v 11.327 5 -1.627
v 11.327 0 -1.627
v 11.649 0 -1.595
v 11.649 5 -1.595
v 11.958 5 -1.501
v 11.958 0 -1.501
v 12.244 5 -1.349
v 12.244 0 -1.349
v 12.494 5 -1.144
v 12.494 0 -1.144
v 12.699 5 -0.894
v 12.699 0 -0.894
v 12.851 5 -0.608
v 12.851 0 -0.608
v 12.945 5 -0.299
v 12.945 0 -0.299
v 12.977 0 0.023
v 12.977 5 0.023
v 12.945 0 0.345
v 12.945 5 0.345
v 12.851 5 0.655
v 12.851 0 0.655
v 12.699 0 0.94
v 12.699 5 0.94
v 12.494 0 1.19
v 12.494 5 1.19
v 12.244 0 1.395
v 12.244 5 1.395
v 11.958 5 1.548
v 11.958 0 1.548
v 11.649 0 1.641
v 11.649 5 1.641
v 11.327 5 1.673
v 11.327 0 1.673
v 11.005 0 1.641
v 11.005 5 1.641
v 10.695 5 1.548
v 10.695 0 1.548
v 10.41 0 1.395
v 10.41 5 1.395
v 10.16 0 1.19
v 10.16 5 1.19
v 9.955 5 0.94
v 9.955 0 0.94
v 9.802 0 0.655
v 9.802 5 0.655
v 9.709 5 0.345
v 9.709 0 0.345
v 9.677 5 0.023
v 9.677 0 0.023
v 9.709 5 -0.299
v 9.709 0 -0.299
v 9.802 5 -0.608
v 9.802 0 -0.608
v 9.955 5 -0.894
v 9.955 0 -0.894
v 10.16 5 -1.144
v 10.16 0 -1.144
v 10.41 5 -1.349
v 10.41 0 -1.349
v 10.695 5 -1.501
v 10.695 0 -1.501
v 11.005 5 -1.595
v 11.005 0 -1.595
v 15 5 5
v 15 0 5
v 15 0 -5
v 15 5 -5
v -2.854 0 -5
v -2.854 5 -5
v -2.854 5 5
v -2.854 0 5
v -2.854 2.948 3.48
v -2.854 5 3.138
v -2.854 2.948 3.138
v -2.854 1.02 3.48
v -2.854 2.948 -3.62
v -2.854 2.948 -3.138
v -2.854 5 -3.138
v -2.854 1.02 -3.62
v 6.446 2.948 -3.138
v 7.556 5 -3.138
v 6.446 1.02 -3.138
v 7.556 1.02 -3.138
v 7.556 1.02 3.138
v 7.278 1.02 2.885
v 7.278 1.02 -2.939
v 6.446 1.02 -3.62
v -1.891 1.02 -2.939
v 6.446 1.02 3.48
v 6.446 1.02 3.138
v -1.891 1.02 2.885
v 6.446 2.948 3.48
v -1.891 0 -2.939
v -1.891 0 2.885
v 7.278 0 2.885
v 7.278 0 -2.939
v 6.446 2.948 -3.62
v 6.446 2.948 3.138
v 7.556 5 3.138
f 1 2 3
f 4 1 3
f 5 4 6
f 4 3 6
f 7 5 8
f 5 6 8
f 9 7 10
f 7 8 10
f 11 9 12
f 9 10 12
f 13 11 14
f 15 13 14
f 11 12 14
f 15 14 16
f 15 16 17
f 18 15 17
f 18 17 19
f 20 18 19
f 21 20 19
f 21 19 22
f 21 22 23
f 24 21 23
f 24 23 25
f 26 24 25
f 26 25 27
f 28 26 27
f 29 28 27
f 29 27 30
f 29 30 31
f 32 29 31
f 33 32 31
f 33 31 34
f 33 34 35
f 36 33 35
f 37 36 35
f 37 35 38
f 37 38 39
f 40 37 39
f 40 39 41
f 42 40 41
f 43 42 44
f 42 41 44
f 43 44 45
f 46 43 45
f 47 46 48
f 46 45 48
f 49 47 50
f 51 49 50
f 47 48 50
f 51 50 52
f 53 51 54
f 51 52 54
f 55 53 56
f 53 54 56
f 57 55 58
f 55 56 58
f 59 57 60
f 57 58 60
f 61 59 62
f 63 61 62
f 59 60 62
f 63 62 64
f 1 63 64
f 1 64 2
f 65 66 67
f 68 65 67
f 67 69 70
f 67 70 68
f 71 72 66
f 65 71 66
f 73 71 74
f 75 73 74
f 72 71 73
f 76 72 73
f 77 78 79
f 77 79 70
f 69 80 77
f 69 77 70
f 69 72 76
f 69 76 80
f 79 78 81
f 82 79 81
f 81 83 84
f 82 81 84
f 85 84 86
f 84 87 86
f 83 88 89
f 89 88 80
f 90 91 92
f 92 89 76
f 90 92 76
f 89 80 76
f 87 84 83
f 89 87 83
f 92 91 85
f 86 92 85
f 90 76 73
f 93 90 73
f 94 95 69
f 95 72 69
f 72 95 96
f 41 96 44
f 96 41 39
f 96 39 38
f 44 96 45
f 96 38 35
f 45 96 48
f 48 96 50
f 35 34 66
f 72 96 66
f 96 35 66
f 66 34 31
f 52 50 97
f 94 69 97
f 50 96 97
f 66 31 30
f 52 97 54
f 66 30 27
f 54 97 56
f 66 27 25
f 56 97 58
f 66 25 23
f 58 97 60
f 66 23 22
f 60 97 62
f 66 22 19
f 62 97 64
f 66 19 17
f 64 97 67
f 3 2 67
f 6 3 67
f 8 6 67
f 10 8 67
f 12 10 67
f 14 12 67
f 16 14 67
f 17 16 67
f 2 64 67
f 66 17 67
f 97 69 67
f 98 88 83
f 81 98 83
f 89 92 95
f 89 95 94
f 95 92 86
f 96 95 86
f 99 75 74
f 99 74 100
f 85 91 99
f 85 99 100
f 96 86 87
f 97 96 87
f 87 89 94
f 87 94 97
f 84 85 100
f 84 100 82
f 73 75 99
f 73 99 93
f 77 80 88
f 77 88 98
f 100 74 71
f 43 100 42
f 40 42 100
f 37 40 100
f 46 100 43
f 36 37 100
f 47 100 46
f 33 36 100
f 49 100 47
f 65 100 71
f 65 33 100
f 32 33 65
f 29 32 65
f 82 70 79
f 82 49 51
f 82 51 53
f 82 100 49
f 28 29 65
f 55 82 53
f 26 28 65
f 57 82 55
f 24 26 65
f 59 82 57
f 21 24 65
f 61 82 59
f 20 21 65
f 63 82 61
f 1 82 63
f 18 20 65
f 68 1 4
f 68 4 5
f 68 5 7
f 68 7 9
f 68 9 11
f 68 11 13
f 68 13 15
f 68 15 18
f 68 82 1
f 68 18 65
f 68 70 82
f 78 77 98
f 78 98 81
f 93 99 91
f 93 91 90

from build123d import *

# Parameters (mm, degrees)
SKETCH2_W           = 17.853706718
SKETCH2_H           = 10
BOSS_EXTRUDE2_DEPTH = 5
SKETCH4_W           = 7.1
SKETCH4_H           = 1.928064037
CUT_EXTRUDE1_DEPTH  = 9.3
CUT_EXTRUDE4_START  = 1.02
SKETCH6_W           = 15.11279267
SKETCH6_H           = 6.275441998
CUT_EXTRUDE4_DEPTH  = 9.3
SKETCH7_R           = 1.65
CUT_EXTRUDE7_DEPTH  = 17.583123952
SKETCH9_W           = 9.168085379
SKETCH9_H           = 5.824430712
CUT_EXTRUDE8_DEPTH  = 17.304612844


with BuildPart() as part:
    # Sketch2 → Boss-Extrude2 (new body)
    with BuildSketch(Plane(origin=(0, 0, 0), x_dir=(1, 0, 0), z_dir=(0, 1, 0))):
        with Locations((6.073146641, 0)):
            Rectangle(SKETCH2_W, SKETCH2_H)
    extrude(amount=BOSS_EXTRUDE2_DEPTH)

    # Sketch4 → Cut-Extrude1 (cut)
    with BuildSketch(Plane.ZY.offset(2.853706718)):
        with Locations((-0.07, 1.984032018)):
            Rectangle(SKETCH4_W, SKETCH4_H)
    extrude(amount=-CUT_EXTRUDE1_DEPTH, mode=Mode.SUBTRACT)

    # Sketch6 → Cut-Extrude4 (cut)
    with BuildSketch(Plane(origin=(0, 0, 0), x_dir=(1, 0, 0), z_dir=(0, 1, 0)).offset(CUT_EXTRUDE4_START)):
        Rectangle(SKETCH6_W, SKETCH6_H)
    extrude(amount=CUT_EXTRUDE4_DEPTH, mode=Mode.SUBTRACT)

    # Sketch7 → Cut-Extrude7 (cut, through all)
    with BuildSketch(Plane.XZ):
        with Locations(Location((11.326869327, 0.023099137, 0), (0, 0, 270))):
            Circle(SKETCH7_R)
    extrude(amount=-CUT_EXTRUDE7_DEPTH, mode=Mode.SUBTRACT)

    # Sketch9 → Cut-Extrude8 (cut, through all)
    with BuildSketch(Plane(origin=(0, 1.02, 0), x_dir=(1, 0, 0), z_dir=(0, 1, 0))):
        with Locations((2.693538698, 0.026964957)):
            Rectangle(SKETCH9_W, SKETCH9_H)
    extrude(amount=-CUT_EXTRUDE8_DEPTH, mode=Mode.SUBTRACT)


solid = part.part
